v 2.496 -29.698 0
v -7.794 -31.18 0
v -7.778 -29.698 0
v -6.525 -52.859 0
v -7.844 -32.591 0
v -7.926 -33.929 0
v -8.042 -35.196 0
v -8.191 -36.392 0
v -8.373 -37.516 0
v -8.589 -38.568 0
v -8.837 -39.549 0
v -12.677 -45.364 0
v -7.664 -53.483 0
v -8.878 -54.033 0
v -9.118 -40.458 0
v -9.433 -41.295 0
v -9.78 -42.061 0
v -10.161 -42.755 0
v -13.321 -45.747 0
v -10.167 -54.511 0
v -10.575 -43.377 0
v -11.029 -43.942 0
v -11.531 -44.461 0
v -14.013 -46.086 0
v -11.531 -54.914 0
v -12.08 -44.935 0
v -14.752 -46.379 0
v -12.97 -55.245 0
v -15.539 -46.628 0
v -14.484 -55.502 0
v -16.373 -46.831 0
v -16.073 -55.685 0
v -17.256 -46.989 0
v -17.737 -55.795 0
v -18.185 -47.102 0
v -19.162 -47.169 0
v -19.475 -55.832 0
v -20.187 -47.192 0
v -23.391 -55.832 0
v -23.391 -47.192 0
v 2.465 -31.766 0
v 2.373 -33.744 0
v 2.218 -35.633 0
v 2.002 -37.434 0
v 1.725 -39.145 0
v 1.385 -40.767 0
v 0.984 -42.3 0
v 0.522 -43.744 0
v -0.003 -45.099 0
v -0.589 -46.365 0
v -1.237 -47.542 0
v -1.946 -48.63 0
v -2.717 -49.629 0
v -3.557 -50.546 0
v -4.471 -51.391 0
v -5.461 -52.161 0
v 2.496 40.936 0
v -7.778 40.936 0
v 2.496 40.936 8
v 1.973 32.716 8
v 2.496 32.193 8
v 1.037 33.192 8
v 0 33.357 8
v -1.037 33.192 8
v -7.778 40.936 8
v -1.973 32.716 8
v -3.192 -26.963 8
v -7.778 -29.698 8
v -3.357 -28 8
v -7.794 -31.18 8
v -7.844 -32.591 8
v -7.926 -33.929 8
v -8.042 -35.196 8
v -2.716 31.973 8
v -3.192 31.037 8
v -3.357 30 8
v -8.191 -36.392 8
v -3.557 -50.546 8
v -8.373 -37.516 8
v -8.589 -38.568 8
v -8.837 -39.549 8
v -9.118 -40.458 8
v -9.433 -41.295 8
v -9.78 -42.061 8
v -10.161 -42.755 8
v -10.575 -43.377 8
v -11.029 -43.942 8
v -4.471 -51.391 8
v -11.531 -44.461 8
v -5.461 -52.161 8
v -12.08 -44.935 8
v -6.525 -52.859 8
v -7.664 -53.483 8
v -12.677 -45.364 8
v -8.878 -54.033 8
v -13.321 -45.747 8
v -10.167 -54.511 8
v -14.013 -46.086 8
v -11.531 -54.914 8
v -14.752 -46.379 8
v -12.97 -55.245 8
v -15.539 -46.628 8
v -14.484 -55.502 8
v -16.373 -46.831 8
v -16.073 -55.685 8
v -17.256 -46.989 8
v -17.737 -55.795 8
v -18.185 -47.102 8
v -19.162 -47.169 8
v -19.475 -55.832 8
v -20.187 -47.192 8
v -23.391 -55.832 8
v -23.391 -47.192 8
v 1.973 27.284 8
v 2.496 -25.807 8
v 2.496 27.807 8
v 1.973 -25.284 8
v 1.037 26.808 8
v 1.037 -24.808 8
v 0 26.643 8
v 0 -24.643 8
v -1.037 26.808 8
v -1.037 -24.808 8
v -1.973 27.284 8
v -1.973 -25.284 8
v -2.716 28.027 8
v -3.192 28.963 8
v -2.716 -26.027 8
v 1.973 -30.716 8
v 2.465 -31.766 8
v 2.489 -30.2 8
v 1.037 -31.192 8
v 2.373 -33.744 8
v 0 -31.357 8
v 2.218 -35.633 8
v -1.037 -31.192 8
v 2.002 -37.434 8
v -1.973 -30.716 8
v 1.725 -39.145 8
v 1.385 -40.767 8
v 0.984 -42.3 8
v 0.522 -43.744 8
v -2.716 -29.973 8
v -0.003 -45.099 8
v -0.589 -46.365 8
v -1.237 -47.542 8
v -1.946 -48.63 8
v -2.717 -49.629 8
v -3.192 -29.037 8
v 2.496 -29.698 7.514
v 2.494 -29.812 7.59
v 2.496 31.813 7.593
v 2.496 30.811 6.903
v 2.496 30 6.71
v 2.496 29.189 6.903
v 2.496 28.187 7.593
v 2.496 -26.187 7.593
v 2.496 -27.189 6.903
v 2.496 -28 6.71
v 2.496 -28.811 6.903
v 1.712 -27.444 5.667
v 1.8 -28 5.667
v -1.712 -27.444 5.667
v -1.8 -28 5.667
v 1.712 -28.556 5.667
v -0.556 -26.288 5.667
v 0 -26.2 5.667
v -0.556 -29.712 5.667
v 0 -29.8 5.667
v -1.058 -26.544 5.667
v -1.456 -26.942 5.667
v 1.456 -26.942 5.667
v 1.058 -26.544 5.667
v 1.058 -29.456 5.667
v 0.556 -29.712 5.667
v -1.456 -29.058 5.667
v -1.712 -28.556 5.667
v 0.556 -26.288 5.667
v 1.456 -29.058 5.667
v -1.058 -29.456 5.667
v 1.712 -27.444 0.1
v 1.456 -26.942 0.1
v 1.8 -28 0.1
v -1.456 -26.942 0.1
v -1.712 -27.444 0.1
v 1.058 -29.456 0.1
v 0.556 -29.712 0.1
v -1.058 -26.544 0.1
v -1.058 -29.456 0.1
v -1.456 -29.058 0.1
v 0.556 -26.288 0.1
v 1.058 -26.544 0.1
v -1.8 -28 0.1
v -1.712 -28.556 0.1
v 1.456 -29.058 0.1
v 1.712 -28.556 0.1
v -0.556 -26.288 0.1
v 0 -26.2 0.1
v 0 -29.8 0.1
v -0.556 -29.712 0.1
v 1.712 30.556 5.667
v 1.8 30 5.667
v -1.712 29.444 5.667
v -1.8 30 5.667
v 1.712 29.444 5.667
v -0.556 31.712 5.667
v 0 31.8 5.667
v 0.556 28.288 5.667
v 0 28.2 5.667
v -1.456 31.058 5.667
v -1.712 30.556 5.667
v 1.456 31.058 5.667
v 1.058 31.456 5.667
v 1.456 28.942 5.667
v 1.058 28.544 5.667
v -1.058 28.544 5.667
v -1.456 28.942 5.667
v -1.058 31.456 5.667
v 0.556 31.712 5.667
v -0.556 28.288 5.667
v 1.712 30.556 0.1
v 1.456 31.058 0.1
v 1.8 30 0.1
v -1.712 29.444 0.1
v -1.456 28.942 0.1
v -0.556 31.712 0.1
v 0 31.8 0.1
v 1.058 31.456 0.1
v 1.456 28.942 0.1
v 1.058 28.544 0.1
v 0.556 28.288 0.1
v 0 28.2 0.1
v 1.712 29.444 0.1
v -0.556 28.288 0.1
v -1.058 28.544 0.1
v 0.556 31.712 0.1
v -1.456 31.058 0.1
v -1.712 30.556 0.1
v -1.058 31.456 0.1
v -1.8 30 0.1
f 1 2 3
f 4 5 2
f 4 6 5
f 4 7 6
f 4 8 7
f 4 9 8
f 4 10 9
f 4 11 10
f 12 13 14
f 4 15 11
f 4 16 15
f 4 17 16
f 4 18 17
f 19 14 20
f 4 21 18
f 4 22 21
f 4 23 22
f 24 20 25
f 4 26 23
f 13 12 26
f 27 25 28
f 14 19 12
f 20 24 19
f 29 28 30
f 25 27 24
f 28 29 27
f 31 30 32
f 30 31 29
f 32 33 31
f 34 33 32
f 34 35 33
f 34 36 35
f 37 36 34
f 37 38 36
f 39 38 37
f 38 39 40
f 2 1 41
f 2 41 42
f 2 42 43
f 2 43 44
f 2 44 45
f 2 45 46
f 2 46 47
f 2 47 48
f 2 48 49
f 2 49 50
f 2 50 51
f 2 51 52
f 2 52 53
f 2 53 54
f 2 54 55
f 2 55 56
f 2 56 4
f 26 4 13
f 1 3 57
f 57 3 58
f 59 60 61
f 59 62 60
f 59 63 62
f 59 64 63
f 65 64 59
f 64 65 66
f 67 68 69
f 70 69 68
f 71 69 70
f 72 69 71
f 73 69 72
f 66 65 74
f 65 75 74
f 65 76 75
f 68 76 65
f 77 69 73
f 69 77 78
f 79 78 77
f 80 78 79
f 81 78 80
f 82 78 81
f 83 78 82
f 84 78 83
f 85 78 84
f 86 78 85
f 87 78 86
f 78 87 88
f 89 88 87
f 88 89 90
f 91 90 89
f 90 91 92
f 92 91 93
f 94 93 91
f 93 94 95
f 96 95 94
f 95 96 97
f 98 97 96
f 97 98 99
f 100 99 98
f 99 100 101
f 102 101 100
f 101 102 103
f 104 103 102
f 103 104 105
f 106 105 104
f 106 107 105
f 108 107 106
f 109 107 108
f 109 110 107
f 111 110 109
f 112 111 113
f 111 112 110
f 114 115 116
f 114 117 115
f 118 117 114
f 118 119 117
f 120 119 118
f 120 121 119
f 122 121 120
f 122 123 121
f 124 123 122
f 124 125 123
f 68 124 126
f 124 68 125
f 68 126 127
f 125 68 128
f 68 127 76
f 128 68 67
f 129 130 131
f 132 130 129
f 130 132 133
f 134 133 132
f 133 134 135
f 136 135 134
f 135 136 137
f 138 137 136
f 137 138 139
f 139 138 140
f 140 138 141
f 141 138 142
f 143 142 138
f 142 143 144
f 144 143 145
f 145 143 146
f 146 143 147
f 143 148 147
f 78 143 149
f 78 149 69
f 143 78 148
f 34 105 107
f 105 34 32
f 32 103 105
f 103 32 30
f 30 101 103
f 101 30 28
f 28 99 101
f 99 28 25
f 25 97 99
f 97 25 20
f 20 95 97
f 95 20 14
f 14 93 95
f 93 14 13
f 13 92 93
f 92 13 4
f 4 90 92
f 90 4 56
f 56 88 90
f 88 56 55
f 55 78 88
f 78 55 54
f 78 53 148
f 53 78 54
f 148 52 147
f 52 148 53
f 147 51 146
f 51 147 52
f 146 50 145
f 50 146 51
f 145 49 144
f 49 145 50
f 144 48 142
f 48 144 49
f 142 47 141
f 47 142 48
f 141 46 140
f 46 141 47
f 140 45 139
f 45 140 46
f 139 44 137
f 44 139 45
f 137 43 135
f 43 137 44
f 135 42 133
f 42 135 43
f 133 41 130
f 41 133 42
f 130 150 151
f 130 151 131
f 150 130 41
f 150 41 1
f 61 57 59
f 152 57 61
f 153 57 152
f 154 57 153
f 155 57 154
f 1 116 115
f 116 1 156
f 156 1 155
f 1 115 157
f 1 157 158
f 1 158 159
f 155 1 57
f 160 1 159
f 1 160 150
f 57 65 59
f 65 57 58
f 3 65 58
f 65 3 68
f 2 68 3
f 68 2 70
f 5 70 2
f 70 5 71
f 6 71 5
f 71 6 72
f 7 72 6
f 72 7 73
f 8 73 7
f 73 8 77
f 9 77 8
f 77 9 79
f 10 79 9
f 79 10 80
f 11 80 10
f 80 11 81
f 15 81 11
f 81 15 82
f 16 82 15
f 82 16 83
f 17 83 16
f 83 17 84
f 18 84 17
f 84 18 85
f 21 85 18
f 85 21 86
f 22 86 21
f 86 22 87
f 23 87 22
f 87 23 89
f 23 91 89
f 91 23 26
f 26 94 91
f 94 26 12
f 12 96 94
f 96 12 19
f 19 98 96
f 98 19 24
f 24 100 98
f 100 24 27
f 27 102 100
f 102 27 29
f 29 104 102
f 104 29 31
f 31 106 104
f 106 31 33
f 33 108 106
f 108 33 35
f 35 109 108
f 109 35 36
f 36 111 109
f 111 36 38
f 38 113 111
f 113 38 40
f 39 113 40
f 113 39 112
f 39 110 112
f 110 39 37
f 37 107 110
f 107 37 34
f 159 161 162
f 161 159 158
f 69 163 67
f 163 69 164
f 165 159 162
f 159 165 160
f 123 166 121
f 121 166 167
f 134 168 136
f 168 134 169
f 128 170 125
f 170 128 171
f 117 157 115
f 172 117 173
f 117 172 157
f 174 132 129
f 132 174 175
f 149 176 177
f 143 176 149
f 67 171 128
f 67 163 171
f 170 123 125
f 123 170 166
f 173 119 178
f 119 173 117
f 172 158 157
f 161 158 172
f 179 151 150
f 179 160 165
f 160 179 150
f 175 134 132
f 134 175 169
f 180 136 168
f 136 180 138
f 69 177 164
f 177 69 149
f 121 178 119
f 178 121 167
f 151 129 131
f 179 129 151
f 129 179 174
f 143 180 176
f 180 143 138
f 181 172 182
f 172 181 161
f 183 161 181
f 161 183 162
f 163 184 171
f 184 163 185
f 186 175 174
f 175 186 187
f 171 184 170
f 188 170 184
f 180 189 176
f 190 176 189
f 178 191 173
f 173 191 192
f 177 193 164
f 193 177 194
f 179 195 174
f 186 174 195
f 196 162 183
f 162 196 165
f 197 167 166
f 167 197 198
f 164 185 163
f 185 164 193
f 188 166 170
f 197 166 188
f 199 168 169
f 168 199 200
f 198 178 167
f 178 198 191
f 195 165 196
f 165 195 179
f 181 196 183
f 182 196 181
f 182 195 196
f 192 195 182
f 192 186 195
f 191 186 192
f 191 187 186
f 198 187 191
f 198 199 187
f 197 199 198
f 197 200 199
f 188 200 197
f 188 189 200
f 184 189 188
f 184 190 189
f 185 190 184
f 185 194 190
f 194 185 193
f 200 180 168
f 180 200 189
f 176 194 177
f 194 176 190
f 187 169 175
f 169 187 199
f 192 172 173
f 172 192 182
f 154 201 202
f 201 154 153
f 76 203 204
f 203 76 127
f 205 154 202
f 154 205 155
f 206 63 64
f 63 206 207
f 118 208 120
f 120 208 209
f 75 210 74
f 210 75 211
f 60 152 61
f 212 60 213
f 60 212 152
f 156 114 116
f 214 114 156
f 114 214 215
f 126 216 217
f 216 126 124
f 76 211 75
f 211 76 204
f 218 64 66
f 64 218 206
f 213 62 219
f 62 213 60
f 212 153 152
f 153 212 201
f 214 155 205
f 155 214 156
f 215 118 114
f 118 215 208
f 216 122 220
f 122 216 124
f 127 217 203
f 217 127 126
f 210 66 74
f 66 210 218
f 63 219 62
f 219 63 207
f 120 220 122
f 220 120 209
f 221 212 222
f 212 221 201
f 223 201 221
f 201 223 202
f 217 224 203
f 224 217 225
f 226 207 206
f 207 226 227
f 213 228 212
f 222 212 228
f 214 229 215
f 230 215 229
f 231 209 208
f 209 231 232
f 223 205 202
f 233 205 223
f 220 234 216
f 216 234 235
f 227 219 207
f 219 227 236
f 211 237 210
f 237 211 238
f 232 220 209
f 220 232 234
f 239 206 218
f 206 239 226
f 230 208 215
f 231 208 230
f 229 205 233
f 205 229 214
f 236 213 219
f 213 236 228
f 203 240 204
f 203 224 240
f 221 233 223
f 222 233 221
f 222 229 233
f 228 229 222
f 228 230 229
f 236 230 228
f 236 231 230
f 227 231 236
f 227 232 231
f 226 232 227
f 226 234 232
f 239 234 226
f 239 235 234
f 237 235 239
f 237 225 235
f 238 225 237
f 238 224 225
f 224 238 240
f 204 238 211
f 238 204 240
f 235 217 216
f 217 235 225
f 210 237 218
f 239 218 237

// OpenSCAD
// Street Numbers for 3D printing
// Charles Tilford, 2019
// License: CC BY-NC-SA 4.0
//   https://creativecommons.org/licenses/by-nc-sa/4.0/

char="J";     // The number/letter to print

// Units are in mm, except for height of letter

// How many inches high should letter be?
inchesHigh=3;
// How thick/deep should letter be (mm)?
depth=8;

// Character coordinates just center the letter
charX=-18;    // Character X coord
charY=-35;    // Character Y coord
topScrew=30;  // Top screw Y coord
botScrew=-28; // Bottom screw Y coord
height=8;     // Thickness of character
// Screw dimensions. Default presumes
// #6 sheet metal screw
screwWid=3.6; // Width of screw shaft
screwTop=6.78;// Width of screw head
screwCon=5.08;// Height of head 'cone'

// Font to print in. Your system needs this
// installed, of course. If changed the hole
// positions almost certainly need to be
// changed, and maybe charX/charY.
fName="Open Sans Extrabold";
// https://fonts.google.com/specimen/Open+Sans
// Designer: Steve Matteson

// Thin floor below holes. My printer was
// struggling to have the hole 'border' stick
// to the stage. Just drill/screw thru it.
holeFloor=0.1; 

// ==========================================
// ===== All values below are auto-calculated
// ==========================================

// Scaled values
scaleFactor=inchesHigh / 3;
cX=charX * scaleFactor;
cY=charY * scaleFactor;
tS=topScrew * scaleFactor;
bS=botScrew * scaleFactor;
// Where do we start drawing screw head cone?
oS=depth - (screwCon-.05);

difference() {
  // We use difference() to punch out the screw holes
  // in the character
    
  // The character itself, 8mm thick
  translate([cX,cY,0])
    linear_extrude(height=depth, scale=1)
    text(char, size=(75*scaleFactor),
         $fn=100, font=fName);
    
  // Bottom screw hole
  translate([0,bS,oS]) color("red")
    cylinder(h=screwCon, d2=screwTop,
             d1=0, $fn=20);
   translate([0,bS,holeFloor])
    cylinder(h=20, d=screwWid, $fn=20);
    
  // Top screw hole
  translate([0,tS,oS]) color("red")
    cylinder(h=screwCon, d2=screwTop,
             d1=0, $fn=20);
  translate([0,tS,holeFloor])
    cylinder(h=20, d=screwWid, $fn=20);
}

// Colors are just to aid visualization of
// void spaces. $fn is "featuer number", ie how
// many polygons are devoted to object. The values
// above should be near your printing limit anyway.

// Developed in OpenSCAD
//    https://www.openscad.org/
